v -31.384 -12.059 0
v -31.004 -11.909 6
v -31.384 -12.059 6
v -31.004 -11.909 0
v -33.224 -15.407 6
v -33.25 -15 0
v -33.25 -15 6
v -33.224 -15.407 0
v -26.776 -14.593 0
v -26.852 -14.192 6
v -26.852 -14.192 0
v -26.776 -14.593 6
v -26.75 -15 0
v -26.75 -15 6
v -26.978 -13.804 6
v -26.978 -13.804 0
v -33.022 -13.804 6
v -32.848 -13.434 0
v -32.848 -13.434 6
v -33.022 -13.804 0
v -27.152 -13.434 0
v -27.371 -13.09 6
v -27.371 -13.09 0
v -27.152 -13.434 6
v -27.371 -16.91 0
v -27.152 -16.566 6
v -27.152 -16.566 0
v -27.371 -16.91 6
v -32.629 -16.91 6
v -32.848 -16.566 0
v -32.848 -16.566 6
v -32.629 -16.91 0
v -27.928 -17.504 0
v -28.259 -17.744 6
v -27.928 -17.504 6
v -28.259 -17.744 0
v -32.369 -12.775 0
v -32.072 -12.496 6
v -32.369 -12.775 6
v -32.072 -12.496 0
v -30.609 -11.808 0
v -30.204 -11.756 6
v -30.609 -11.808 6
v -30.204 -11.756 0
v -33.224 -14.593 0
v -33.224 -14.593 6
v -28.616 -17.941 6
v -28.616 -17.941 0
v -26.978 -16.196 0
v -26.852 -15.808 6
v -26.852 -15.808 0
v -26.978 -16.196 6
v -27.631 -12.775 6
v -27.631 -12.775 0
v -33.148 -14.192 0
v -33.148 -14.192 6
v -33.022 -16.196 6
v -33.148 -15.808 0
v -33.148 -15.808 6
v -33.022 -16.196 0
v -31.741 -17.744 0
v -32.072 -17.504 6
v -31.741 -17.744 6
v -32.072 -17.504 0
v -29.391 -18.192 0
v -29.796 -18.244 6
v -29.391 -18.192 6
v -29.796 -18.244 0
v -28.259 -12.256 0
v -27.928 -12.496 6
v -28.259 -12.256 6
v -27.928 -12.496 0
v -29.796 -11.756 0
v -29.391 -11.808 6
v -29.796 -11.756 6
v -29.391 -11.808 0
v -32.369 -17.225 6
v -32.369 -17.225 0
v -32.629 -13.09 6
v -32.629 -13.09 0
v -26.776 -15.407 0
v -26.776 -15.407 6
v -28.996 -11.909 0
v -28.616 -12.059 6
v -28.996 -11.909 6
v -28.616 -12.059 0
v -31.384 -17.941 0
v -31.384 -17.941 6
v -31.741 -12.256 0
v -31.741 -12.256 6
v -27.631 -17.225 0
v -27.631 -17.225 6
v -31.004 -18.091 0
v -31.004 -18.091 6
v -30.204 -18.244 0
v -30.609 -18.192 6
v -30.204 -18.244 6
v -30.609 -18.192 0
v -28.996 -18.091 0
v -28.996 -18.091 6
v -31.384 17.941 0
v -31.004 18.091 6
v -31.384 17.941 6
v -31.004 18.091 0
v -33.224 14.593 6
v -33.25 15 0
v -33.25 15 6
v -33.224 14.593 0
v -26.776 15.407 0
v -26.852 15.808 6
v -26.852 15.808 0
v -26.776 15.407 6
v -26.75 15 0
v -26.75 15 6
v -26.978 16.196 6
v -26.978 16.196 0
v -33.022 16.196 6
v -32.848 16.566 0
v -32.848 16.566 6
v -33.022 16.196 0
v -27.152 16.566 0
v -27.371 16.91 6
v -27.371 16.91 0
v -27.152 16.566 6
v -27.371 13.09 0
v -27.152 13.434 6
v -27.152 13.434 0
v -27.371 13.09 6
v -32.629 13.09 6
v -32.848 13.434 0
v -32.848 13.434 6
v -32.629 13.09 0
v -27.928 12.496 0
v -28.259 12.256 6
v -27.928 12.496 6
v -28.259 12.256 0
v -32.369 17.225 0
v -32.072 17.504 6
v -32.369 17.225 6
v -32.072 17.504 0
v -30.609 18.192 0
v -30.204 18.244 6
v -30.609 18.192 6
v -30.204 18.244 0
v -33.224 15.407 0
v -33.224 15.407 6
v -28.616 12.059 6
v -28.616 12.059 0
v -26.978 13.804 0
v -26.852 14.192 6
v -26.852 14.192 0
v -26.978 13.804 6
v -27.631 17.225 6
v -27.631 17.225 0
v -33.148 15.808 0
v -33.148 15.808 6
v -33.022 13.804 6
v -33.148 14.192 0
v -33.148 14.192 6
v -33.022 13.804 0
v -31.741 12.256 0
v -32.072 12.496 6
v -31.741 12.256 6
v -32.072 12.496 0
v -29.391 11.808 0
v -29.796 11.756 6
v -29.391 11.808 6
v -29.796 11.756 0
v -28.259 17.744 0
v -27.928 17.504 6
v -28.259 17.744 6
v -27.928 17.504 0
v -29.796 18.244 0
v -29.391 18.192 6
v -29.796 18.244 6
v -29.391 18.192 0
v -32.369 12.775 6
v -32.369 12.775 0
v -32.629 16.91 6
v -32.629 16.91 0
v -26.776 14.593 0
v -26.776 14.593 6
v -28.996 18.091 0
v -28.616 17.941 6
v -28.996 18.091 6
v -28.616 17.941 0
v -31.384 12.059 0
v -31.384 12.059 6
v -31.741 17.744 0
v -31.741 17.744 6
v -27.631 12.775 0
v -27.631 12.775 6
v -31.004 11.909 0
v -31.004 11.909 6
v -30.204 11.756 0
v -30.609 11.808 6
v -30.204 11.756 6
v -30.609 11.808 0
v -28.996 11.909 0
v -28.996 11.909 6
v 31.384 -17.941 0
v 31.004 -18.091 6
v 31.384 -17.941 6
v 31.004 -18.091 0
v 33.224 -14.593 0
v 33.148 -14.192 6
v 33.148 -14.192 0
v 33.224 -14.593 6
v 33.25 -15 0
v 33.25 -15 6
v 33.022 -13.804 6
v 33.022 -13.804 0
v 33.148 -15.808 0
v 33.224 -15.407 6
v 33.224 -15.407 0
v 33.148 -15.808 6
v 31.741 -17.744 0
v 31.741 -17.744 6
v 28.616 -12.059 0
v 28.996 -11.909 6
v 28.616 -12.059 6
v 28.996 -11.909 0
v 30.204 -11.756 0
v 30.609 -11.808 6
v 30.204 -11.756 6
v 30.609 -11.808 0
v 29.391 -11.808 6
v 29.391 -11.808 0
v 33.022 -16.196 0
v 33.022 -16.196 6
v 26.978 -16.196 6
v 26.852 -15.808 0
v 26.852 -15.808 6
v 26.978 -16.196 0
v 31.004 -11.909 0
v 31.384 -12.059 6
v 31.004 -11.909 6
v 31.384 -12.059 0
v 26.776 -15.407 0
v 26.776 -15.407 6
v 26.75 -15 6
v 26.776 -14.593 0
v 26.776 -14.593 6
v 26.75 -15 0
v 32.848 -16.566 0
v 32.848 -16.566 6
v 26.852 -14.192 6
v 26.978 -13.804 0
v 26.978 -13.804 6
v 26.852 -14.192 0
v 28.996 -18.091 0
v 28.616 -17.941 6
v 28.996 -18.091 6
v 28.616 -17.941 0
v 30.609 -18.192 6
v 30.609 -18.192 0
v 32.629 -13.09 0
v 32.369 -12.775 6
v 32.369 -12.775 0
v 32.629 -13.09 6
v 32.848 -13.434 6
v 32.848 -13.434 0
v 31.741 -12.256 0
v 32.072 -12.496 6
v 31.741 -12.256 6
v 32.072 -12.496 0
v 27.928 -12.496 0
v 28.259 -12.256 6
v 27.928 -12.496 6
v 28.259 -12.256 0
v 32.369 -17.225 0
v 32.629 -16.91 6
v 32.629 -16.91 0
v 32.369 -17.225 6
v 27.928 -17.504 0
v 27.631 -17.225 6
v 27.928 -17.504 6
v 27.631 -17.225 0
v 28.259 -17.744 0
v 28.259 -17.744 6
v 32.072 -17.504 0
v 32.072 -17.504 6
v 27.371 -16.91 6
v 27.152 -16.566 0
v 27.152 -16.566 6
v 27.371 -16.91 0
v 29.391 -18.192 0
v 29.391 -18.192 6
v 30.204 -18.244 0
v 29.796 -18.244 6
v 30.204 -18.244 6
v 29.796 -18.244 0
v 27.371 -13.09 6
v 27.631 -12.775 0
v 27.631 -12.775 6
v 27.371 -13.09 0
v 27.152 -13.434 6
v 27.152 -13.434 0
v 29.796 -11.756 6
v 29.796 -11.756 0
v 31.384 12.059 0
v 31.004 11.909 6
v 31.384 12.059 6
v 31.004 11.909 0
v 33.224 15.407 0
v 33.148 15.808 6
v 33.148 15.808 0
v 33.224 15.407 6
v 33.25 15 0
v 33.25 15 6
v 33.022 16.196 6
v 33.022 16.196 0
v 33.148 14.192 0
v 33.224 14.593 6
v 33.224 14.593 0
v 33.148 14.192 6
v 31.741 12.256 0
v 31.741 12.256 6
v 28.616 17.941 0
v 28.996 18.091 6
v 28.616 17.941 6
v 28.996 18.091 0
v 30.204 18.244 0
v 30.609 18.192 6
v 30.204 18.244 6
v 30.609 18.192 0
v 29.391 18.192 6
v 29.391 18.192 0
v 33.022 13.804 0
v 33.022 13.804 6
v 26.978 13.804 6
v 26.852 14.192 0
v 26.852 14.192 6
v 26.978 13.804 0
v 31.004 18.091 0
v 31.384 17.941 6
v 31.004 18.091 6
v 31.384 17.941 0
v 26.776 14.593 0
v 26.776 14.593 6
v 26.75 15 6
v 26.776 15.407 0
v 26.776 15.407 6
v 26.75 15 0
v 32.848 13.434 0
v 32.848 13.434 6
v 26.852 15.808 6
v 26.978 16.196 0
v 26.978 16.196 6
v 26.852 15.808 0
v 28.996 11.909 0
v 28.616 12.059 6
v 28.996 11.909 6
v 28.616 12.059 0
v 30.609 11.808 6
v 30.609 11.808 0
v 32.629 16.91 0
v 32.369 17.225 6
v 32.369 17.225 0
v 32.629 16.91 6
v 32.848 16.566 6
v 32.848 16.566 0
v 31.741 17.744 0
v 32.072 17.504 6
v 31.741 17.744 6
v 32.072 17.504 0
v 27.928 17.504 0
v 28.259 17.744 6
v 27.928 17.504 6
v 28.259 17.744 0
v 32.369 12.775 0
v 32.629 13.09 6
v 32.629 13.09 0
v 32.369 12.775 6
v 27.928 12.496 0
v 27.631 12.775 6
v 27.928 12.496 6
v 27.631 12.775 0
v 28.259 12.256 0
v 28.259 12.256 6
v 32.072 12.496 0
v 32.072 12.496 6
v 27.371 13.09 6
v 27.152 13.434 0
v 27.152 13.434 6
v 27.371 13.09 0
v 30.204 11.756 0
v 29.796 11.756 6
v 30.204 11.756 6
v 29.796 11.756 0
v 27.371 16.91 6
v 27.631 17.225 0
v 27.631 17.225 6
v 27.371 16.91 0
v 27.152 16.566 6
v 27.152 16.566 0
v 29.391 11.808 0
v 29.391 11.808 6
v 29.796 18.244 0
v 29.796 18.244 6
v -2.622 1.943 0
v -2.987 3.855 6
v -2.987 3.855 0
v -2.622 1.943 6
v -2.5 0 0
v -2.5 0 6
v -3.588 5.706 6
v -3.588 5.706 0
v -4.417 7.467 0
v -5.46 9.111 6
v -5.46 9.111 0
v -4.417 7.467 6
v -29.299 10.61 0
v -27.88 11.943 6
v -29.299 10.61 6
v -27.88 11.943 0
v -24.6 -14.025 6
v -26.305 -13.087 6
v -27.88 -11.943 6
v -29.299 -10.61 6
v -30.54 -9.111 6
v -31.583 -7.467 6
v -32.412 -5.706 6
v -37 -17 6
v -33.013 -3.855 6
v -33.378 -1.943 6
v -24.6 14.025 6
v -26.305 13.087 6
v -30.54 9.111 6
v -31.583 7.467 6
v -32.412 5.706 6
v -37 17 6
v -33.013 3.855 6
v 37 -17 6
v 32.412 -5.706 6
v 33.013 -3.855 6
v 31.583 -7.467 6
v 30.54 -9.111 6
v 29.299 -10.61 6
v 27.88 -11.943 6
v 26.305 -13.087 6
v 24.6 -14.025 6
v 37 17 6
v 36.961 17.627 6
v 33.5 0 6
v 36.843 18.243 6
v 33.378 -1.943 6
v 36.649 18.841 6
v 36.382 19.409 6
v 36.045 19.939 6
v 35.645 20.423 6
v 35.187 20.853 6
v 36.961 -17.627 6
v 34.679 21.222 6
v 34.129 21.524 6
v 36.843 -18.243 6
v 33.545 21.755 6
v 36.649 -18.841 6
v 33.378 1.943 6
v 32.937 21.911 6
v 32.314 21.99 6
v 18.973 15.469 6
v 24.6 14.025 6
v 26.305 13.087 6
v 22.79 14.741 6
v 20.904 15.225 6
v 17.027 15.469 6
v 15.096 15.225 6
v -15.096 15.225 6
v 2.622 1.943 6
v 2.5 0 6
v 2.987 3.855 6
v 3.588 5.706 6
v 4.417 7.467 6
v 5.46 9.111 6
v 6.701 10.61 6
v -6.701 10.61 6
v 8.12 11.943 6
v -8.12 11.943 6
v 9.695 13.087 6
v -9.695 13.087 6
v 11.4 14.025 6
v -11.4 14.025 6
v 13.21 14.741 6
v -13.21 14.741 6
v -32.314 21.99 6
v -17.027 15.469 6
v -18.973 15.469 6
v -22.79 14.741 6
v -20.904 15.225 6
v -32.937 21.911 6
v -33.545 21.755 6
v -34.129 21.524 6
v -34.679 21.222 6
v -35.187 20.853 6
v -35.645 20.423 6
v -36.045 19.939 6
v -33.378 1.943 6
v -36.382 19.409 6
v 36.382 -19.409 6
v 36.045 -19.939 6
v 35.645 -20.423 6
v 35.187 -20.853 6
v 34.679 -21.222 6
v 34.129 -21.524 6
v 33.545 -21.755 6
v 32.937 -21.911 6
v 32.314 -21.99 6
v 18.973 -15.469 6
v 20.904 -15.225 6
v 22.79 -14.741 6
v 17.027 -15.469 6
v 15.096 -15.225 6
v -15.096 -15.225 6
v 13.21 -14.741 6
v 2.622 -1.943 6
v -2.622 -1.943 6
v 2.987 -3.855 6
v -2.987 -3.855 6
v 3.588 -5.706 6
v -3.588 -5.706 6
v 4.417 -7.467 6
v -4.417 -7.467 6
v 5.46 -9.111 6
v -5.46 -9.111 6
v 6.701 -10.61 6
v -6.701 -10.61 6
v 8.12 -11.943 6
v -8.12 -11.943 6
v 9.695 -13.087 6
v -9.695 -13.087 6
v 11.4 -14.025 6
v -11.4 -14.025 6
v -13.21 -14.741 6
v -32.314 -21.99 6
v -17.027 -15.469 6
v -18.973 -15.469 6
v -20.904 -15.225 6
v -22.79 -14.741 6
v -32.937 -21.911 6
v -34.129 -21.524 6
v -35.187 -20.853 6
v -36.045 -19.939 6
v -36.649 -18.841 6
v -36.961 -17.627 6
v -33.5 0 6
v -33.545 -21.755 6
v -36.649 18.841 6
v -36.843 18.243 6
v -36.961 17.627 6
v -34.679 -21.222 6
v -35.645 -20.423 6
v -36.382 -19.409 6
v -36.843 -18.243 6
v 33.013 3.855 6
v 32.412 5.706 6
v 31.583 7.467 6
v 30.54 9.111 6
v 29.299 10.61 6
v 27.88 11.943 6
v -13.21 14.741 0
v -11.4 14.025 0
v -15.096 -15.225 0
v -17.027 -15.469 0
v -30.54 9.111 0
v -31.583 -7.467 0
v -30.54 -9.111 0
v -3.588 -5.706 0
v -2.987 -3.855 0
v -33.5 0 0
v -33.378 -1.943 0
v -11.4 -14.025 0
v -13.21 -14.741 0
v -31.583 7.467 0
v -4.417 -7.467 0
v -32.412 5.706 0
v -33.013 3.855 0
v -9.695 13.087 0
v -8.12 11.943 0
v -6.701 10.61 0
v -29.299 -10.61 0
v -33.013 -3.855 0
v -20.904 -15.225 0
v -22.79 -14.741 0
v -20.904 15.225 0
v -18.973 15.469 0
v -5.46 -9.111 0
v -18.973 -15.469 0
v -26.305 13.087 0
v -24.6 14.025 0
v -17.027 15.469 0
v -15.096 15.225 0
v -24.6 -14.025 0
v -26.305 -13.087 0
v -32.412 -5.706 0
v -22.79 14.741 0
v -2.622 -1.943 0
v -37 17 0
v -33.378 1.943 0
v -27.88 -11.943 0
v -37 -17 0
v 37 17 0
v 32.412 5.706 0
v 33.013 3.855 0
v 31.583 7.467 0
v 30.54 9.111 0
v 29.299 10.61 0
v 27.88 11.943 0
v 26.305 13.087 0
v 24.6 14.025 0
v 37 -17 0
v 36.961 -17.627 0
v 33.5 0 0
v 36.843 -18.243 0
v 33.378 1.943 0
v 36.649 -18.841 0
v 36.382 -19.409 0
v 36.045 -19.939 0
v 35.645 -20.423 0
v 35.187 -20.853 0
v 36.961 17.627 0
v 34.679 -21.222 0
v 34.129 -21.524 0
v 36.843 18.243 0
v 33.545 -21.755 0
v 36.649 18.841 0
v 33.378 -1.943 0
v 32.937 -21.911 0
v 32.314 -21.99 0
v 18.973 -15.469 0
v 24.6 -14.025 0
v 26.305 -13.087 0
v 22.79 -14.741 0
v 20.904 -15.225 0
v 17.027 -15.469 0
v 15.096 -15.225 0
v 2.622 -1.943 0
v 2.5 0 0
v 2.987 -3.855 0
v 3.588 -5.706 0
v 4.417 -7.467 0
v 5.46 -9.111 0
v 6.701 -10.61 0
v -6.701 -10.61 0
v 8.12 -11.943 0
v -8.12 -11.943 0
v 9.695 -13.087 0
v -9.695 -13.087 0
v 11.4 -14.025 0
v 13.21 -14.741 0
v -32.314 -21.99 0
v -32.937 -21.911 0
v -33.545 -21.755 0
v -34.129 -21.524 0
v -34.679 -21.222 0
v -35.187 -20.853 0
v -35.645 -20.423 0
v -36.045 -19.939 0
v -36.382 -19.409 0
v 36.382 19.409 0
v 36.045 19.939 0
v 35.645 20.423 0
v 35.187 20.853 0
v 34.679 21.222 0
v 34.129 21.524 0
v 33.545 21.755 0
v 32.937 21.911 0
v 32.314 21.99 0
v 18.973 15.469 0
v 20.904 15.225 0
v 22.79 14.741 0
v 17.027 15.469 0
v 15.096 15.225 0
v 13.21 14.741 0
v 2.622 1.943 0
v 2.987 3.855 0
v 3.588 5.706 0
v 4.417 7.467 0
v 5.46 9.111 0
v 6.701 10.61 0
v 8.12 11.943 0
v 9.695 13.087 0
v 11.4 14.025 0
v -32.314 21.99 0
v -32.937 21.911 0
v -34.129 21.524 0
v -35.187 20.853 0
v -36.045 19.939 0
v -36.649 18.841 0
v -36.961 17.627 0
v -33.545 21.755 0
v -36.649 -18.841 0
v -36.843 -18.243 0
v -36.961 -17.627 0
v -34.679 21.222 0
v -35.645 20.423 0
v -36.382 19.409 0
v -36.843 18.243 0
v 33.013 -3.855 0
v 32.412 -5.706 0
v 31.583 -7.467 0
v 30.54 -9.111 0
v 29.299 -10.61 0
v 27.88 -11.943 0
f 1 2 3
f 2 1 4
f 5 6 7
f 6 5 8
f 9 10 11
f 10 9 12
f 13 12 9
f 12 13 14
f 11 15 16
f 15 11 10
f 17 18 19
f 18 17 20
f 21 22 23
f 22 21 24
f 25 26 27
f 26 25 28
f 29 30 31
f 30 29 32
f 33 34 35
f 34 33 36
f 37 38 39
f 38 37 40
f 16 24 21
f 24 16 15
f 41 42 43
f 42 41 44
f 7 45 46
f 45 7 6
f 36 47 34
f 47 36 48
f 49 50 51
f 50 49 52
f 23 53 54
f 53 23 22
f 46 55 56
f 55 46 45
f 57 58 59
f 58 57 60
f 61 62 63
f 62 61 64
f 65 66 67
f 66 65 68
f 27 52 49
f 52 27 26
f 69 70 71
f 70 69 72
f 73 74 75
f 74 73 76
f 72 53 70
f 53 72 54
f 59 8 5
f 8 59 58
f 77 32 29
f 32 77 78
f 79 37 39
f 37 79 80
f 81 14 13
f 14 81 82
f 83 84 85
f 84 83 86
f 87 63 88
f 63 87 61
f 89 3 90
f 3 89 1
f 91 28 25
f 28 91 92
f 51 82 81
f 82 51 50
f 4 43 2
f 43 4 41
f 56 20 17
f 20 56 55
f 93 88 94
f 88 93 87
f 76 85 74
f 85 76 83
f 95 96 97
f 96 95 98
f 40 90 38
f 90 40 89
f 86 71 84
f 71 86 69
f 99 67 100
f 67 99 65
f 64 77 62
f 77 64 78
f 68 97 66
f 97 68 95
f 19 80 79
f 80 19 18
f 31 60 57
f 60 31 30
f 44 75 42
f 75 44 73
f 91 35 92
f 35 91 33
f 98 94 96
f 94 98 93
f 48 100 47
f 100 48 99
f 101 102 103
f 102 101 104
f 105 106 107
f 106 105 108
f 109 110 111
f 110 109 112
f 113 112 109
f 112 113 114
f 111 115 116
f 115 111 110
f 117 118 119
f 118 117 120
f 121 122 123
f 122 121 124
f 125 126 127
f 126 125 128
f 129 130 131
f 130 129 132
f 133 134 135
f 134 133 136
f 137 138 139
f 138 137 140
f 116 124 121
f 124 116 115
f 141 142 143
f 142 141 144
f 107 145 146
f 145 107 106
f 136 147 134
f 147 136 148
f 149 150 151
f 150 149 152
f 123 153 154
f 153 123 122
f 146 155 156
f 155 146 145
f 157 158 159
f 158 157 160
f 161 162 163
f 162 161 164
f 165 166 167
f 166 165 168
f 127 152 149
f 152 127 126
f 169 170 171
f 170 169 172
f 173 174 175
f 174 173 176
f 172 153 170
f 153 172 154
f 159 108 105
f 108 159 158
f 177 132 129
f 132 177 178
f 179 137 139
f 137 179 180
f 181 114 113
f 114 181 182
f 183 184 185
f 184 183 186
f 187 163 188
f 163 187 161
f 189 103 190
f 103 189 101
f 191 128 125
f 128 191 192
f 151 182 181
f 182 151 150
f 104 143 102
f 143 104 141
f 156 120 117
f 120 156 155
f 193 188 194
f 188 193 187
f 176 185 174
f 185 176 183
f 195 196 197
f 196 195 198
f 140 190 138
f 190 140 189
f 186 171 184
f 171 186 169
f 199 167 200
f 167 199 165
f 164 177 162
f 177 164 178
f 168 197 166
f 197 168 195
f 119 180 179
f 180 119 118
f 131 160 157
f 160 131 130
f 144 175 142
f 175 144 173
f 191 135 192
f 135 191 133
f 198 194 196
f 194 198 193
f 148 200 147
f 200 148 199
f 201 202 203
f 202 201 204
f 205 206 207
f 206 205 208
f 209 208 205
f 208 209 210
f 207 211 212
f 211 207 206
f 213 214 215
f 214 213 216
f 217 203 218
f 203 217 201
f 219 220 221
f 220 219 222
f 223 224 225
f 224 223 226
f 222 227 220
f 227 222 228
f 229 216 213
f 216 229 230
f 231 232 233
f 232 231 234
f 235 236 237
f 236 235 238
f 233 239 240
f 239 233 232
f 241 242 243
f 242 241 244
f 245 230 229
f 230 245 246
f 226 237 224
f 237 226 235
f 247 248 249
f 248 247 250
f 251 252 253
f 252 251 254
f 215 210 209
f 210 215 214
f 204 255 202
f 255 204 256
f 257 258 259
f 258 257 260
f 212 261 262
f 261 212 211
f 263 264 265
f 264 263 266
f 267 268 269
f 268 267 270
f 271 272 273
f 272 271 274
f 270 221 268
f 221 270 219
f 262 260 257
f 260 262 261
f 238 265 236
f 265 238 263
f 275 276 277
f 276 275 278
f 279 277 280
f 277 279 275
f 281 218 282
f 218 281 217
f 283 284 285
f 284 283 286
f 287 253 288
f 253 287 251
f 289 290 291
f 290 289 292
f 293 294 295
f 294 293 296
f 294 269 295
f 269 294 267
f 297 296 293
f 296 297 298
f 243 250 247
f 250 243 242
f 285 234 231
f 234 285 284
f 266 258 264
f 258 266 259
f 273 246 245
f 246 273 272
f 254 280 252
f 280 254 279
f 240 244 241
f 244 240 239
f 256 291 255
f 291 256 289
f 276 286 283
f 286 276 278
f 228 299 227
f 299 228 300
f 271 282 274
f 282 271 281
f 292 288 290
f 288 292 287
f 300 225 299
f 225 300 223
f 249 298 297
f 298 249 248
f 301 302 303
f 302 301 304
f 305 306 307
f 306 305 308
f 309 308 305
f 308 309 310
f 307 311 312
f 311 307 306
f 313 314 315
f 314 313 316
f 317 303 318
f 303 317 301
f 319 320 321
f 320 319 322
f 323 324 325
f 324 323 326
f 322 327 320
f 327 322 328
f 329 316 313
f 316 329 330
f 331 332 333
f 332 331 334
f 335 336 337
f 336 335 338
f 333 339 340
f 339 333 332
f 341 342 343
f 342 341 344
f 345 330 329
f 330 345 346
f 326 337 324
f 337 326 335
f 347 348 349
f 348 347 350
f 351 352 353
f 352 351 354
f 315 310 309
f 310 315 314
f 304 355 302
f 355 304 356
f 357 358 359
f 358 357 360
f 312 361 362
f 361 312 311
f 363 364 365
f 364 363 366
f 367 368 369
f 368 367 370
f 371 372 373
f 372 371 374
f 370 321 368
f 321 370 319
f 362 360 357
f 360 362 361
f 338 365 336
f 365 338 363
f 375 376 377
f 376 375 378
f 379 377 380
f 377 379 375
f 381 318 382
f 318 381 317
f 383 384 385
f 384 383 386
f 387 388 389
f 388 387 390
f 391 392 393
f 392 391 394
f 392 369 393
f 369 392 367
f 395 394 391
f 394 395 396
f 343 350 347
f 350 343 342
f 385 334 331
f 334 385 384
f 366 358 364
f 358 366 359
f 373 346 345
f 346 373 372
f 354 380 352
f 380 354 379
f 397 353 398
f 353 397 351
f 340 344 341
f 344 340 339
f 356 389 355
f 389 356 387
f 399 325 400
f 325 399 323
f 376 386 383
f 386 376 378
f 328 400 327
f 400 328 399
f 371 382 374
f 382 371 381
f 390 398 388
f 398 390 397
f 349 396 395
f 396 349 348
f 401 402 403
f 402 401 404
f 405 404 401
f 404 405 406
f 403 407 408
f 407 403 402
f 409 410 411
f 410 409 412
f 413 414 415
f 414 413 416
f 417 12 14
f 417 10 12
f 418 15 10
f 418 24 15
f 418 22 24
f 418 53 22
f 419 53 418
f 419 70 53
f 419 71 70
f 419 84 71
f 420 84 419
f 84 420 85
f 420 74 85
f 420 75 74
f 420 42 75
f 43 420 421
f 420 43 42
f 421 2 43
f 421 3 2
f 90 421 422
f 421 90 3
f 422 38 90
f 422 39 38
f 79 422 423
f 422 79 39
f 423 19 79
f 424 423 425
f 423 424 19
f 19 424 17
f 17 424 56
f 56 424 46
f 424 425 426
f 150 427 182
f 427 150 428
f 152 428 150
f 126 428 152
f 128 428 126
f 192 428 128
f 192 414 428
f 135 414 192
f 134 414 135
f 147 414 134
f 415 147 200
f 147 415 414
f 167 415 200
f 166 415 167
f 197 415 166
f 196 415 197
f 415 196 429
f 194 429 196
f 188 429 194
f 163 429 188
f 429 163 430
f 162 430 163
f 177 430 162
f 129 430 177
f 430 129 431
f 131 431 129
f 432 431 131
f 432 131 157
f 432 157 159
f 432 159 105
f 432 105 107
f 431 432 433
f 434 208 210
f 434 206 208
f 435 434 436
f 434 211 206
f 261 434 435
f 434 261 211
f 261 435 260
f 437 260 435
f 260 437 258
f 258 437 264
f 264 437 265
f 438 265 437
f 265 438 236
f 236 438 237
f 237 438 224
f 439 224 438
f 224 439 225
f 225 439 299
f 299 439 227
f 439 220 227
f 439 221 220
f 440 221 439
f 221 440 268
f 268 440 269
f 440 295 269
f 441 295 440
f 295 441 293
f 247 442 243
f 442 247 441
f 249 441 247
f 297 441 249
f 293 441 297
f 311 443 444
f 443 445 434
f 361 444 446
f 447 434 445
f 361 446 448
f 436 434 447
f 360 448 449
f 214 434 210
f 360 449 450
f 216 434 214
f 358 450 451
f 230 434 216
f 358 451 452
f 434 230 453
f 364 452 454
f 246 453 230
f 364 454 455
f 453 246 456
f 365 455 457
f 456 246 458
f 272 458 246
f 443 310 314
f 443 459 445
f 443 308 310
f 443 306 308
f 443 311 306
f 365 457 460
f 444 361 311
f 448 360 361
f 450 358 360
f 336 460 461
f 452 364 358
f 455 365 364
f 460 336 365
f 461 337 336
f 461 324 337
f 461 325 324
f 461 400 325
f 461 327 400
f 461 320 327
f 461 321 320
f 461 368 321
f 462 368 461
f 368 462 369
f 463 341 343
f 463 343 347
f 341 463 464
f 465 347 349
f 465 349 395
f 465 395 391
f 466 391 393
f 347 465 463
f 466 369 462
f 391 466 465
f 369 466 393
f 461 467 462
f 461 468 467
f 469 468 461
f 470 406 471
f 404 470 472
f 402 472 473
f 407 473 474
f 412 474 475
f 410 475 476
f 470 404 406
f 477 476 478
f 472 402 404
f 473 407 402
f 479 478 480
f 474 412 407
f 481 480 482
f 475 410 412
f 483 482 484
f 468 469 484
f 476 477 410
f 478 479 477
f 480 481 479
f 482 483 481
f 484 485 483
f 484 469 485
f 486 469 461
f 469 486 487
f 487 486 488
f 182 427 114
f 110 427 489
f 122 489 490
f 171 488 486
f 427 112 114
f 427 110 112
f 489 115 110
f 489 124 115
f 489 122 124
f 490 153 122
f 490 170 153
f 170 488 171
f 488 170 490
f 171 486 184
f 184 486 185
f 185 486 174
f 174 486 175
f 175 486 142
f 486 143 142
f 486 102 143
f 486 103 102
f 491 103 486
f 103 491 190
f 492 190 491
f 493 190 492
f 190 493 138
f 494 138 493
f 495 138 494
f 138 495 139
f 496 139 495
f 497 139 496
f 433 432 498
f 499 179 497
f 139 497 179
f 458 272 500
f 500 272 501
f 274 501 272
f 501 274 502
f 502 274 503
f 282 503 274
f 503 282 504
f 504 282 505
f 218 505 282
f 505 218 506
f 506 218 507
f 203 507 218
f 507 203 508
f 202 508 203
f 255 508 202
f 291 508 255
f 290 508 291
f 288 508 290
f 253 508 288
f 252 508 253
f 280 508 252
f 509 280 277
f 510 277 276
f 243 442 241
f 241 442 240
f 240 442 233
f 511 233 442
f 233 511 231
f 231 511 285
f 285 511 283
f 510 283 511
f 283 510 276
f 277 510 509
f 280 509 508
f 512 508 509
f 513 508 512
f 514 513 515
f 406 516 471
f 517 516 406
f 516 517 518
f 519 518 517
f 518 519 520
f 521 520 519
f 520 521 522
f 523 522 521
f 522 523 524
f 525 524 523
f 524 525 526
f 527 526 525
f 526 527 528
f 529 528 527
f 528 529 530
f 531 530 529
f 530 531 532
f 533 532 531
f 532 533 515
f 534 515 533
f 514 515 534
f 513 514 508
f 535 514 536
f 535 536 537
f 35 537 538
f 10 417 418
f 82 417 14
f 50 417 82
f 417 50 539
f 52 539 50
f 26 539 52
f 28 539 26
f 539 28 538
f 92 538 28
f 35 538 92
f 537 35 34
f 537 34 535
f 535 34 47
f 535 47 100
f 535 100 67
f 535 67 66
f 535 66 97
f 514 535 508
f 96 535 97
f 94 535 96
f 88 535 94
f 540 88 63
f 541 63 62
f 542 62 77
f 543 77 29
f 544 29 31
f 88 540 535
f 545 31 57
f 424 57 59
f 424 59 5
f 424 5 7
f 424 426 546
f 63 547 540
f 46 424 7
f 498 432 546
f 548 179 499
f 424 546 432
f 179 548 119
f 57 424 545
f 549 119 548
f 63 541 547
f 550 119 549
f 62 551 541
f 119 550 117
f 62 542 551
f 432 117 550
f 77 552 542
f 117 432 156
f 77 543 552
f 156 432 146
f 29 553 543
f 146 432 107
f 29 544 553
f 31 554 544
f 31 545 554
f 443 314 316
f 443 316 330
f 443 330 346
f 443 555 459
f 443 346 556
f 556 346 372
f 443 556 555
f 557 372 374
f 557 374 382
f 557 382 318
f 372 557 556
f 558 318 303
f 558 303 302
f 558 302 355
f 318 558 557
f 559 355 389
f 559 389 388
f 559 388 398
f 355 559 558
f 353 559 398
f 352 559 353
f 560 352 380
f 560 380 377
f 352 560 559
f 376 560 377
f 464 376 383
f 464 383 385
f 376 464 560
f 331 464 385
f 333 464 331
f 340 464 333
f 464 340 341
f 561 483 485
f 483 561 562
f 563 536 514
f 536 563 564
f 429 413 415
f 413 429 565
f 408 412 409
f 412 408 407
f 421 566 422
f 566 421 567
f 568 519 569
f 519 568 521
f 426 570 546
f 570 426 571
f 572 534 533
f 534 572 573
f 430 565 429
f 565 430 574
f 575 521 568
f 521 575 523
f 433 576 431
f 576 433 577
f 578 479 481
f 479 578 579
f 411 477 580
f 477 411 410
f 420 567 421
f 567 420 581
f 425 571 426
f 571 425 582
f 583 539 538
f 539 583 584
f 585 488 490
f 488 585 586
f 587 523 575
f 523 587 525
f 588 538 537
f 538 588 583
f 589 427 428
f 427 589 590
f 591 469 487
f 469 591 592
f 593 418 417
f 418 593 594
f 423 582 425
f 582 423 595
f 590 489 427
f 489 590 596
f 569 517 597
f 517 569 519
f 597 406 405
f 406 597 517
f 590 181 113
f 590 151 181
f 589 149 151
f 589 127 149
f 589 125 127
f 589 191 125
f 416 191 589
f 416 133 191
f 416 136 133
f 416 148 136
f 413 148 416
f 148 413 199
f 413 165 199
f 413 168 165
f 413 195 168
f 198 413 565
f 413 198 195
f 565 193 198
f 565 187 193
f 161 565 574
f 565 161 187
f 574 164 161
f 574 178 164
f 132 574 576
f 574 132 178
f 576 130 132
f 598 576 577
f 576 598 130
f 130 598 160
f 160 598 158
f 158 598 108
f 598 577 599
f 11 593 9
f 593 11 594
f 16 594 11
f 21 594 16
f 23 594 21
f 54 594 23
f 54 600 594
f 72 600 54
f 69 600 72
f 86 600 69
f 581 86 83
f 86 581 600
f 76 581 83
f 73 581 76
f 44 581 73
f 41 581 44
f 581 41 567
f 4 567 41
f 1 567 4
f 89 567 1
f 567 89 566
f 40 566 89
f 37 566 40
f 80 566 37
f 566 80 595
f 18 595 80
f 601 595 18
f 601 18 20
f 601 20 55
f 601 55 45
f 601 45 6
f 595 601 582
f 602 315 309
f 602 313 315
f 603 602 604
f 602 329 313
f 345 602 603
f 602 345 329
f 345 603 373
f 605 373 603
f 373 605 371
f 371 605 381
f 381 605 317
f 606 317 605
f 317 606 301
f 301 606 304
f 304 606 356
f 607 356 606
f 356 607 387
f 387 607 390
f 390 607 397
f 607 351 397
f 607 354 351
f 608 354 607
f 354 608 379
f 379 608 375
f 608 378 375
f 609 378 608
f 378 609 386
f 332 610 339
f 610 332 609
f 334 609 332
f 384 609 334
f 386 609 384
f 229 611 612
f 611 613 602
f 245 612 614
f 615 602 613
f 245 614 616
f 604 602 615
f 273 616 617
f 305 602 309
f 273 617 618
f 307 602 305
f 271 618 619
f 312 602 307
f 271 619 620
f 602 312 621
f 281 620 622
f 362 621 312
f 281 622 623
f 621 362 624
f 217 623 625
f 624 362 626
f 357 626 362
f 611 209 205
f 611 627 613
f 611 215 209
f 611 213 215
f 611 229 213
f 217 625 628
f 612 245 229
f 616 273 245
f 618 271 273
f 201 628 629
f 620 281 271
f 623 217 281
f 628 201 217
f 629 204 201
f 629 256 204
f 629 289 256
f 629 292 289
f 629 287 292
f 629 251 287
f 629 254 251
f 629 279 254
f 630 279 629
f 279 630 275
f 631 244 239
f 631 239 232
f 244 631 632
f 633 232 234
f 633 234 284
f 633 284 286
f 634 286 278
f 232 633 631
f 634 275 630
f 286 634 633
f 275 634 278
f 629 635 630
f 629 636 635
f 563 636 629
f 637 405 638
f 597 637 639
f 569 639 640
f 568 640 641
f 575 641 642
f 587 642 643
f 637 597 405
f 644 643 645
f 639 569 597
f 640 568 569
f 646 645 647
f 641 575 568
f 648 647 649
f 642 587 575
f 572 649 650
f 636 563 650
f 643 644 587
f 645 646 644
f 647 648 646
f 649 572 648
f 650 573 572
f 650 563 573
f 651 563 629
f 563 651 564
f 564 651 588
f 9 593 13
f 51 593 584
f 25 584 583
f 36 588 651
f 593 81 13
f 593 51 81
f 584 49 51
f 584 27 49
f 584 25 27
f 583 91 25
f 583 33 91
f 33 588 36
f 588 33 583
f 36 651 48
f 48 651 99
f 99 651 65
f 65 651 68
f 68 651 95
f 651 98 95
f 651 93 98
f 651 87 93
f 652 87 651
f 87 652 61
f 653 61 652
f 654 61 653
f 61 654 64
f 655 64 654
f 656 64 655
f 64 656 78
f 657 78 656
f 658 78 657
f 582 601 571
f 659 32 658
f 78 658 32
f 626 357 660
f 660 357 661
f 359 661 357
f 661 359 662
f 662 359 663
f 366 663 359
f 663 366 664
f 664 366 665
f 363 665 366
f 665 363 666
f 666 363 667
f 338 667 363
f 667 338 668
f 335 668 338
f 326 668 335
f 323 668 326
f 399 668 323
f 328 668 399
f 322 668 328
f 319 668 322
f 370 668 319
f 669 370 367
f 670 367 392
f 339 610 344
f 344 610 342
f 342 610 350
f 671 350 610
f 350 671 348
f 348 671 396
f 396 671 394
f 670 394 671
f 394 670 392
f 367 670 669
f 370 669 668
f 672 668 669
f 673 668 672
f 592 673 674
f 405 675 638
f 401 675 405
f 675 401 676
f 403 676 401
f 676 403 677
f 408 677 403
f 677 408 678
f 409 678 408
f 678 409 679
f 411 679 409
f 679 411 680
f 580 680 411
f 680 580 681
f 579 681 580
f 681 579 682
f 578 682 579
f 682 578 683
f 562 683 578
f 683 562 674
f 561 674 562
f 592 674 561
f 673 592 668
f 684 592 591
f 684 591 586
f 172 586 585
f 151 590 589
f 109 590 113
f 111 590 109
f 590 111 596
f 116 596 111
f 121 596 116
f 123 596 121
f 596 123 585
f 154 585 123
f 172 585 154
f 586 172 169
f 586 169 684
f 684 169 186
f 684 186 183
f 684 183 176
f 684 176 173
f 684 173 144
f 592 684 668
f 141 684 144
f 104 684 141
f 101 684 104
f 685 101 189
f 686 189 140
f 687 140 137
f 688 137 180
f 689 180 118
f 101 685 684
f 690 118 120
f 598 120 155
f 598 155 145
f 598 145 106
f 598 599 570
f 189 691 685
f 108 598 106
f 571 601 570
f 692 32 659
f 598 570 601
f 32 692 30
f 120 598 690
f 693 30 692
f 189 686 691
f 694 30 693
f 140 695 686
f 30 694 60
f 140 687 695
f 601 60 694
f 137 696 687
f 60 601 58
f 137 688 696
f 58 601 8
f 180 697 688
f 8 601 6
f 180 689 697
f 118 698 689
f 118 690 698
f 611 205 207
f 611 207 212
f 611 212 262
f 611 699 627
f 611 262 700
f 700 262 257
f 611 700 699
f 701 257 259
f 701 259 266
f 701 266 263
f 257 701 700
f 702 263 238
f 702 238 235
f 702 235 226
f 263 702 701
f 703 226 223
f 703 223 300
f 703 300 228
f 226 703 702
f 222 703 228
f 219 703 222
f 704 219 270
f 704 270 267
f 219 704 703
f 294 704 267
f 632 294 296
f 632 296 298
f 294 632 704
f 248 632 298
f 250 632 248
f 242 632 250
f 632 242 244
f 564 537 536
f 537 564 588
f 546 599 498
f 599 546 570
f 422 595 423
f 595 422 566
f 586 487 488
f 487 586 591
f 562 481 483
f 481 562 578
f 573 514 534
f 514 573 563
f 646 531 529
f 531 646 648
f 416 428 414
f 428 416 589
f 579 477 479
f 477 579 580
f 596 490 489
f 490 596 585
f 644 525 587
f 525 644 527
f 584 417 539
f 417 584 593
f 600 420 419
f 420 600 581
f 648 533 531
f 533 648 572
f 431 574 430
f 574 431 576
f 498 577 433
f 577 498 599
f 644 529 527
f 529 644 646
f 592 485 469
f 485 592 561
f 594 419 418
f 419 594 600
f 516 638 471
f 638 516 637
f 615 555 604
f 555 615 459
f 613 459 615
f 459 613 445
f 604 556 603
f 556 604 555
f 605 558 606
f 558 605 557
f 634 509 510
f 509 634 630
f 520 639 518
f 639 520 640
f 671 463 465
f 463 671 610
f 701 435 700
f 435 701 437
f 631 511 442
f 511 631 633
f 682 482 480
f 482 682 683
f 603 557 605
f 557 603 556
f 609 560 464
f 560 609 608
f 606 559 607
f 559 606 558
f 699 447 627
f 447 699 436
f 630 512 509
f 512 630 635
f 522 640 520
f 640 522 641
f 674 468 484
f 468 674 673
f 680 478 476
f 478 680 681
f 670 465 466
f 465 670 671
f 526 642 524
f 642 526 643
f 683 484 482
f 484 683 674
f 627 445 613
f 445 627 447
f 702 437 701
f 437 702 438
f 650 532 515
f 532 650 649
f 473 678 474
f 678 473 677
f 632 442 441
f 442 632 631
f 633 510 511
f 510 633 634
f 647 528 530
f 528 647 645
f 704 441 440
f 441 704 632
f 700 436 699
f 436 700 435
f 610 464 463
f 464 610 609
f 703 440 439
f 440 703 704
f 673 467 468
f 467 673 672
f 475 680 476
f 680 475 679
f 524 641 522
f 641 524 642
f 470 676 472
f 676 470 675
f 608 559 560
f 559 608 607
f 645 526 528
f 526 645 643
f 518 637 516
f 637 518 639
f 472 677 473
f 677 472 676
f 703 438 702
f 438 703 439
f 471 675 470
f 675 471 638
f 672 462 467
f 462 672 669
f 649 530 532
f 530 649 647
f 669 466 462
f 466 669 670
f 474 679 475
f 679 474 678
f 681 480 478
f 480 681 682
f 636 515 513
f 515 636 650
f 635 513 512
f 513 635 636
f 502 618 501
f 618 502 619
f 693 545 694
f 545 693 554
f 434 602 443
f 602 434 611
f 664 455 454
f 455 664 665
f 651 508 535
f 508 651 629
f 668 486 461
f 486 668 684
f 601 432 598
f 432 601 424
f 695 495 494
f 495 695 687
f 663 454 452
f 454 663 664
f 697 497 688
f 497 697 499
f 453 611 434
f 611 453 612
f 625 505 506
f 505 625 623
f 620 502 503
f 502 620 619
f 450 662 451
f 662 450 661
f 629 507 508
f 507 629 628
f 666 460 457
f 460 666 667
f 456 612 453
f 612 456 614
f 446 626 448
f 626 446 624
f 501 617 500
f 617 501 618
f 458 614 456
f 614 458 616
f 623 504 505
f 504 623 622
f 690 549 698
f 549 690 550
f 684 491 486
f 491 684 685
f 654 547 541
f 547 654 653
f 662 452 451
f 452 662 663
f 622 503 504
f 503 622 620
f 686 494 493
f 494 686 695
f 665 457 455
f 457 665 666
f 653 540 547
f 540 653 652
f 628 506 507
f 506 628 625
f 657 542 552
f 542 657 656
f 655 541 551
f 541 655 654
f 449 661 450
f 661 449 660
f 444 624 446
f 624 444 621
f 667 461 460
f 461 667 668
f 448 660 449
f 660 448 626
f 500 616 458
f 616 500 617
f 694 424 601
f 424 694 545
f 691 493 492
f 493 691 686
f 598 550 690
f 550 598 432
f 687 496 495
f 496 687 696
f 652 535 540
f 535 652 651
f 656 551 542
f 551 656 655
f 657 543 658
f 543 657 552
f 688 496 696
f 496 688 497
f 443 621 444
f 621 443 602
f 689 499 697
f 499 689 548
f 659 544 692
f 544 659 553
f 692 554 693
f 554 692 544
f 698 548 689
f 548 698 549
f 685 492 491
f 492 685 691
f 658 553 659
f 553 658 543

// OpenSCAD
$fn = 50;


difference() {
	union() {
		hull() {
			translate(v = [-32.0000000000, 17.0000000000, 0]) {
				cylinder(h = 6, r = 5);
			}
			translate(v = [32.0000000000, 17.0000000000, 0]) {
				cylinder(h = 6, r = 5);
			}
			translate(v = [-32.0000000000, -17.0000000000, 0]) {
				cylinder(h = 6, r = 5);
			}
			translate(v = [32.0000000000, -17.0000000000, 0]) {
				cylinder(h = 6, r = 5);
			}
		}
	}
	union() {
		#translate(v = [-30.0000000000, -15.0000000000, -100.0000000000]) {
			cylinder(h = 200, r = 3.2500000000);
		}
		#translate(v = [-30.0000000000, 15.0000000000, -100.0000000000]) {
			cylinder(h = 200, r = 3.2500000000);
		}
		#translate(v = [30.0000000000, -15.0000000000, -100.0000000000]) {
			cylinder(h = 200, r = 3.2500000000);
		}
		#translate(v = [30.0000000000, 15.0000000000, -100.0000000000]) {
			cylinder(h = 200, r = 3.2500000000);
		}
		#translate(v = [-18.0000000000, 0, 0]) {
			cylinder(h = 6, r = 15.5000000000);
		}
		#translate(v = [18.0000000000, 0, 0]) {
			cylinder(h = 6, r = 15.5000000000);
		}
	}
}
